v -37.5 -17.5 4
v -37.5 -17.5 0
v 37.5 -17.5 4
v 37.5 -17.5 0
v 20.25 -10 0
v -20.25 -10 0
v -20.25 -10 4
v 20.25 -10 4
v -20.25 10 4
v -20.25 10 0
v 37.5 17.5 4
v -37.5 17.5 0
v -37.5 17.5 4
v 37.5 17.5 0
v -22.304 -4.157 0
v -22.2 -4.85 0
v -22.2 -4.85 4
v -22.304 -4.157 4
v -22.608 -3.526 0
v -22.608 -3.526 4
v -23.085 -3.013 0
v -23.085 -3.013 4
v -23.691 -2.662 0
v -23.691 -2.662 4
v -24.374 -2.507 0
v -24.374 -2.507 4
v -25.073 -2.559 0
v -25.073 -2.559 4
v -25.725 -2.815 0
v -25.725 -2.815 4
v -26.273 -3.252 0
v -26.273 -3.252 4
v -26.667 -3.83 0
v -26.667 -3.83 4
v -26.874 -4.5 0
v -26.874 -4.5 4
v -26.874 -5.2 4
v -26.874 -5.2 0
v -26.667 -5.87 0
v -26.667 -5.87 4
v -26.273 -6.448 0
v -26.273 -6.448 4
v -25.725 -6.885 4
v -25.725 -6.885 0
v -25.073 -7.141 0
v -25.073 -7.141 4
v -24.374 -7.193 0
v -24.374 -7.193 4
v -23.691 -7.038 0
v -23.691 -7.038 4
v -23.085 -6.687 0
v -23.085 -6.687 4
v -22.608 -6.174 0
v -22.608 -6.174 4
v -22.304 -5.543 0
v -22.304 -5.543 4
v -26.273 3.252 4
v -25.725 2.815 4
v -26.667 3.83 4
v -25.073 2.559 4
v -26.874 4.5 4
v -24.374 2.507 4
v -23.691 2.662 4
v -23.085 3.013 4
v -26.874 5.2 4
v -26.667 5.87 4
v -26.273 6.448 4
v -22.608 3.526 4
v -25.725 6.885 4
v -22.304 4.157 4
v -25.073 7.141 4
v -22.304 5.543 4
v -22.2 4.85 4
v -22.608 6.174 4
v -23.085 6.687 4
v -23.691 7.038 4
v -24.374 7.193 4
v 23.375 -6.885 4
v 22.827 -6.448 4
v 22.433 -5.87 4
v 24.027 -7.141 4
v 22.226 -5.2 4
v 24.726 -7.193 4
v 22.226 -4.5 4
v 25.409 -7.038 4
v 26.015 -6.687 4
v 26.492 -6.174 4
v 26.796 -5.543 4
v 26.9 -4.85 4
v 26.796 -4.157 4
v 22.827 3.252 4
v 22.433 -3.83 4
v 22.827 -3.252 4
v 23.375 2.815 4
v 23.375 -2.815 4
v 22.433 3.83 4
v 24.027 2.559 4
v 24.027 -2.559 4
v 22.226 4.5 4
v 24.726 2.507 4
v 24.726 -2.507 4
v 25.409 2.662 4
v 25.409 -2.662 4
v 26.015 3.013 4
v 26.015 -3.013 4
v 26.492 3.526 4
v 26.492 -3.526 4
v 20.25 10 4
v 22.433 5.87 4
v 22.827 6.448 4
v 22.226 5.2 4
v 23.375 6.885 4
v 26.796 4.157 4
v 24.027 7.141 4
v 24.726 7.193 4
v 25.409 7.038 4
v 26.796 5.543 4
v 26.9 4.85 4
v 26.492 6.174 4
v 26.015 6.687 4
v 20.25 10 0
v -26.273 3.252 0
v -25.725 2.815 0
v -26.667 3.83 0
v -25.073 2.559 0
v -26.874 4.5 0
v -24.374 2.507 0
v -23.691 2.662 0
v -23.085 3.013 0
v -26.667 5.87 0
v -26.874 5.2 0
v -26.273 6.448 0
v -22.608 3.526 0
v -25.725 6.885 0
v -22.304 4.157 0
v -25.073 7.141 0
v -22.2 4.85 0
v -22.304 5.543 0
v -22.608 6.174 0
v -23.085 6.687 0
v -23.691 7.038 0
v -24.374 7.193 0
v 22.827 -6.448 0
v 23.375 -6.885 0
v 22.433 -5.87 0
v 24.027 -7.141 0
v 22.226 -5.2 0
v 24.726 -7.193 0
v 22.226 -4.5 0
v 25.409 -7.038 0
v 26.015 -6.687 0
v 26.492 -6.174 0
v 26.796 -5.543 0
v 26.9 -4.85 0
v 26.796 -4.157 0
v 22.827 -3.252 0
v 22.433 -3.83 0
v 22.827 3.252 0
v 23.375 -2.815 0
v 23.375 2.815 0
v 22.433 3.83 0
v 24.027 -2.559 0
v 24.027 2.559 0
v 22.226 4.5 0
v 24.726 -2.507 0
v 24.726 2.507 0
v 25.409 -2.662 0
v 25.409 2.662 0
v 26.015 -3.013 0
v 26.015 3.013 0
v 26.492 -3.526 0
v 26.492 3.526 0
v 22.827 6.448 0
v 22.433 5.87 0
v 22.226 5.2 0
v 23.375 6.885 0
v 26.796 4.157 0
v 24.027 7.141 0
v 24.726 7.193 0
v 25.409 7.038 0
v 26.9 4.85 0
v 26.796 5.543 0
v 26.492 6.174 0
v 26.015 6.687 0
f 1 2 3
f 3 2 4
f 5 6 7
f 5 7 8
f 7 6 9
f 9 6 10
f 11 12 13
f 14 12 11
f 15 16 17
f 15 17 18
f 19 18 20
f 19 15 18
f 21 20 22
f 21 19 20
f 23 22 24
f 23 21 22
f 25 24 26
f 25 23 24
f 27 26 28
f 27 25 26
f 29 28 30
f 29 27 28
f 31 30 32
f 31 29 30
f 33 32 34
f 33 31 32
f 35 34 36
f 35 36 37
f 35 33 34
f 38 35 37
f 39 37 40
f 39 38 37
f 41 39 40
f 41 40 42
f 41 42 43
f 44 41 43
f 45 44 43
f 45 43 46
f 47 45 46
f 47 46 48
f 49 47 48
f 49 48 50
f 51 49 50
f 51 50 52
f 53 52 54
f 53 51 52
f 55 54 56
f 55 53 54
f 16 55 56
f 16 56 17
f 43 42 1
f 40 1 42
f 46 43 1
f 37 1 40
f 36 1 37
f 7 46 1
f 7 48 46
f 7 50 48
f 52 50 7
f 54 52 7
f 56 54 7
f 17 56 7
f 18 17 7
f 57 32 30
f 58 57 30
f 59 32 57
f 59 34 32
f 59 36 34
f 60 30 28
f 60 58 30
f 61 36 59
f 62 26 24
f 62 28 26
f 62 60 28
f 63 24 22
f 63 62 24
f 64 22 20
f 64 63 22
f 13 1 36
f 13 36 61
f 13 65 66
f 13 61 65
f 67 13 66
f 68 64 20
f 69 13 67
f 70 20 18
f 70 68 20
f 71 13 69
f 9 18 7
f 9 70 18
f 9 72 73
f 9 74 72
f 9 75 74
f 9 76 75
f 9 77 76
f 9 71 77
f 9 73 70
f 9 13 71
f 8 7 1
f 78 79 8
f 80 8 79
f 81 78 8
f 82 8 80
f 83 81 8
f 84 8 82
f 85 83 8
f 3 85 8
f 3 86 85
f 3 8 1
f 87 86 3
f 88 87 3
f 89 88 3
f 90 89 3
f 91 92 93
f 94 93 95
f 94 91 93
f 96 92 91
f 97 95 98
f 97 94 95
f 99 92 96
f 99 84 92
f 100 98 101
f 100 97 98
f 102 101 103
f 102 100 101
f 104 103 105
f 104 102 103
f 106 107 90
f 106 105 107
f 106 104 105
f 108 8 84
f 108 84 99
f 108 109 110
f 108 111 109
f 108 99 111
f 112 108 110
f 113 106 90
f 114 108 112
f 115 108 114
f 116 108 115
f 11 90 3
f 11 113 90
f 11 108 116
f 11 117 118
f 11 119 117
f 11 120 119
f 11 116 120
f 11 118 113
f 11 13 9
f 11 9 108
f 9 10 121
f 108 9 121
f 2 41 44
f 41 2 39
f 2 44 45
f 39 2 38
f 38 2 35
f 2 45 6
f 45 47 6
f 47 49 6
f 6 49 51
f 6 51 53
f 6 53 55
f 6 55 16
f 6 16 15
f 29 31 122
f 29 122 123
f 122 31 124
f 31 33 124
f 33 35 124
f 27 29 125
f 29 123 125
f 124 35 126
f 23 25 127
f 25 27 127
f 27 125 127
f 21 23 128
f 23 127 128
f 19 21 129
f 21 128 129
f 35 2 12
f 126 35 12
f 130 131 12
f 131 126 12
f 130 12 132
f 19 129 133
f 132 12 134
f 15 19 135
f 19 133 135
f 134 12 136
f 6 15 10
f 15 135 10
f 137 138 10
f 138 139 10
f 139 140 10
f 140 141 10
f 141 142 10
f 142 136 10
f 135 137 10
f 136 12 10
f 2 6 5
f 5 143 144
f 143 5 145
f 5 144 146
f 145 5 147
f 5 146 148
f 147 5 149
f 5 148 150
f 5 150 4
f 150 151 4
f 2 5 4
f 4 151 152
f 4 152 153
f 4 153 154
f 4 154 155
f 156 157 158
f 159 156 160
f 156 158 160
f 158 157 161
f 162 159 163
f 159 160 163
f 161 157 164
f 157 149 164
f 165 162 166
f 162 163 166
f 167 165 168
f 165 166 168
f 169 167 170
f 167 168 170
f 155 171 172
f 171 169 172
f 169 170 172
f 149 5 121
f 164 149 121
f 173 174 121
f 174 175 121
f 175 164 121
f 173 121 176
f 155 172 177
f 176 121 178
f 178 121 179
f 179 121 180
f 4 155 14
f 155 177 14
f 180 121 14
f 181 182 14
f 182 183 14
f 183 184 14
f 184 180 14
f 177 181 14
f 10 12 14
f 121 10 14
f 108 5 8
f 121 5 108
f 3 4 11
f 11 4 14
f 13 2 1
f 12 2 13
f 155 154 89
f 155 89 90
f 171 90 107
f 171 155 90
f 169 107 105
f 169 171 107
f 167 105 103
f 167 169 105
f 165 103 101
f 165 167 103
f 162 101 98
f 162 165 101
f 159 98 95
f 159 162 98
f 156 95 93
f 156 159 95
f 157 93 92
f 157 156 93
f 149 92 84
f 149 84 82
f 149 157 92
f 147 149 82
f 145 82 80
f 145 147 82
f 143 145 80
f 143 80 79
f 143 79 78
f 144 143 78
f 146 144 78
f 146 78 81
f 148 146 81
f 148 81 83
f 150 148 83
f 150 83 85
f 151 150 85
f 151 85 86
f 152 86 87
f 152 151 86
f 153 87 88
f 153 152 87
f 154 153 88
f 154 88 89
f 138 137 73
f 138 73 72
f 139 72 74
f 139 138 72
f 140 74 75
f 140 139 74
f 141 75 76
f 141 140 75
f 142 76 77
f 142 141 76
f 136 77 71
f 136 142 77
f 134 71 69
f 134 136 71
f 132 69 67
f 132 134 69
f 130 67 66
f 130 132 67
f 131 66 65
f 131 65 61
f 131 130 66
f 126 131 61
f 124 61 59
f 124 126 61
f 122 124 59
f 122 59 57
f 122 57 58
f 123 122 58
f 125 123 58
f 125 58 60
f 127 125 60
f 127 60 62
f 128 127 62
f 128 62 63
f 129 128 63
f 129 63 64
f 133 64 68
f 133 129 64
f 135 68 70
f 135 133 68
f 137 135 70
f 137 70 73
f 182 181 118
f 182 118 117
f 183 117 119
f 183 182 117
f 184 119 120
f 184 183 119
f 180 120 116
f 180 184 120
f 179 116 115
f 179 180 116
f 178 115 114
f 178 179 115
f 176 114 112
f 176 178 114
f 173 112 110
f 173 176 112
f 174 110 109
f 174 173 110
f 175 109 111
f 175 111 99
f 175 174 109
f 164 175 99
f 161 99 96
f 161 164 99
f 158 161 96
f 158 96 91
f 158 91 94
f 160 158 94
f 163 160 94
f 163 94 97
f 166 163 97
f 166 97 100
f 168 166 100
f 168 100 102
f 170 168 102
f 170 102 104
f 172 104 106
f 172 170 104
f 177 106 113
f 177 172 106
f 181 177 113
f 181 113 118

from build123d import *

# Parameters (mm, degrees)
SKETCH1_W           = 75
SKETCH1_H           = 35
SKETCH1_R           = 2.35
SKETCH1_W_2         = 40.5
SKETCH1_H_2         = 20
BOSS_EXTRUDE1_DEPTH = 4


with BuildPart() as part:
    # Sketch1 → Boss-Extrude1 (new body)
    with BuildSketch(Plane.XY):
        Rectangle(SKETCH1_W, SKETCH1_H)
        with Locations((-24.55, 4.85)):
            Circle(SKETCH1_R, mode=Mode.SUBTRACT)
        with Locations((-24.55, -4.85)):
            Circle(SKETCH1_R, mode=Mode.SUBTRACT)
        with Locations((24.55, -4.85)):
            Circle(SKETCH1_R, mode=Mode.SUBTRACT)
        with Locations((24.55, 4.85)):
            Circle(SKETCH1_R, mode=Mode.SUBTRACT)
        Rectangle(SKETCH1_W_2, SKETCH1_H_2, mode=Mode.SUBTRACT)
    extrude(amount=BOSS_EXTRUDE1_DEPTH)


solid = part.part
